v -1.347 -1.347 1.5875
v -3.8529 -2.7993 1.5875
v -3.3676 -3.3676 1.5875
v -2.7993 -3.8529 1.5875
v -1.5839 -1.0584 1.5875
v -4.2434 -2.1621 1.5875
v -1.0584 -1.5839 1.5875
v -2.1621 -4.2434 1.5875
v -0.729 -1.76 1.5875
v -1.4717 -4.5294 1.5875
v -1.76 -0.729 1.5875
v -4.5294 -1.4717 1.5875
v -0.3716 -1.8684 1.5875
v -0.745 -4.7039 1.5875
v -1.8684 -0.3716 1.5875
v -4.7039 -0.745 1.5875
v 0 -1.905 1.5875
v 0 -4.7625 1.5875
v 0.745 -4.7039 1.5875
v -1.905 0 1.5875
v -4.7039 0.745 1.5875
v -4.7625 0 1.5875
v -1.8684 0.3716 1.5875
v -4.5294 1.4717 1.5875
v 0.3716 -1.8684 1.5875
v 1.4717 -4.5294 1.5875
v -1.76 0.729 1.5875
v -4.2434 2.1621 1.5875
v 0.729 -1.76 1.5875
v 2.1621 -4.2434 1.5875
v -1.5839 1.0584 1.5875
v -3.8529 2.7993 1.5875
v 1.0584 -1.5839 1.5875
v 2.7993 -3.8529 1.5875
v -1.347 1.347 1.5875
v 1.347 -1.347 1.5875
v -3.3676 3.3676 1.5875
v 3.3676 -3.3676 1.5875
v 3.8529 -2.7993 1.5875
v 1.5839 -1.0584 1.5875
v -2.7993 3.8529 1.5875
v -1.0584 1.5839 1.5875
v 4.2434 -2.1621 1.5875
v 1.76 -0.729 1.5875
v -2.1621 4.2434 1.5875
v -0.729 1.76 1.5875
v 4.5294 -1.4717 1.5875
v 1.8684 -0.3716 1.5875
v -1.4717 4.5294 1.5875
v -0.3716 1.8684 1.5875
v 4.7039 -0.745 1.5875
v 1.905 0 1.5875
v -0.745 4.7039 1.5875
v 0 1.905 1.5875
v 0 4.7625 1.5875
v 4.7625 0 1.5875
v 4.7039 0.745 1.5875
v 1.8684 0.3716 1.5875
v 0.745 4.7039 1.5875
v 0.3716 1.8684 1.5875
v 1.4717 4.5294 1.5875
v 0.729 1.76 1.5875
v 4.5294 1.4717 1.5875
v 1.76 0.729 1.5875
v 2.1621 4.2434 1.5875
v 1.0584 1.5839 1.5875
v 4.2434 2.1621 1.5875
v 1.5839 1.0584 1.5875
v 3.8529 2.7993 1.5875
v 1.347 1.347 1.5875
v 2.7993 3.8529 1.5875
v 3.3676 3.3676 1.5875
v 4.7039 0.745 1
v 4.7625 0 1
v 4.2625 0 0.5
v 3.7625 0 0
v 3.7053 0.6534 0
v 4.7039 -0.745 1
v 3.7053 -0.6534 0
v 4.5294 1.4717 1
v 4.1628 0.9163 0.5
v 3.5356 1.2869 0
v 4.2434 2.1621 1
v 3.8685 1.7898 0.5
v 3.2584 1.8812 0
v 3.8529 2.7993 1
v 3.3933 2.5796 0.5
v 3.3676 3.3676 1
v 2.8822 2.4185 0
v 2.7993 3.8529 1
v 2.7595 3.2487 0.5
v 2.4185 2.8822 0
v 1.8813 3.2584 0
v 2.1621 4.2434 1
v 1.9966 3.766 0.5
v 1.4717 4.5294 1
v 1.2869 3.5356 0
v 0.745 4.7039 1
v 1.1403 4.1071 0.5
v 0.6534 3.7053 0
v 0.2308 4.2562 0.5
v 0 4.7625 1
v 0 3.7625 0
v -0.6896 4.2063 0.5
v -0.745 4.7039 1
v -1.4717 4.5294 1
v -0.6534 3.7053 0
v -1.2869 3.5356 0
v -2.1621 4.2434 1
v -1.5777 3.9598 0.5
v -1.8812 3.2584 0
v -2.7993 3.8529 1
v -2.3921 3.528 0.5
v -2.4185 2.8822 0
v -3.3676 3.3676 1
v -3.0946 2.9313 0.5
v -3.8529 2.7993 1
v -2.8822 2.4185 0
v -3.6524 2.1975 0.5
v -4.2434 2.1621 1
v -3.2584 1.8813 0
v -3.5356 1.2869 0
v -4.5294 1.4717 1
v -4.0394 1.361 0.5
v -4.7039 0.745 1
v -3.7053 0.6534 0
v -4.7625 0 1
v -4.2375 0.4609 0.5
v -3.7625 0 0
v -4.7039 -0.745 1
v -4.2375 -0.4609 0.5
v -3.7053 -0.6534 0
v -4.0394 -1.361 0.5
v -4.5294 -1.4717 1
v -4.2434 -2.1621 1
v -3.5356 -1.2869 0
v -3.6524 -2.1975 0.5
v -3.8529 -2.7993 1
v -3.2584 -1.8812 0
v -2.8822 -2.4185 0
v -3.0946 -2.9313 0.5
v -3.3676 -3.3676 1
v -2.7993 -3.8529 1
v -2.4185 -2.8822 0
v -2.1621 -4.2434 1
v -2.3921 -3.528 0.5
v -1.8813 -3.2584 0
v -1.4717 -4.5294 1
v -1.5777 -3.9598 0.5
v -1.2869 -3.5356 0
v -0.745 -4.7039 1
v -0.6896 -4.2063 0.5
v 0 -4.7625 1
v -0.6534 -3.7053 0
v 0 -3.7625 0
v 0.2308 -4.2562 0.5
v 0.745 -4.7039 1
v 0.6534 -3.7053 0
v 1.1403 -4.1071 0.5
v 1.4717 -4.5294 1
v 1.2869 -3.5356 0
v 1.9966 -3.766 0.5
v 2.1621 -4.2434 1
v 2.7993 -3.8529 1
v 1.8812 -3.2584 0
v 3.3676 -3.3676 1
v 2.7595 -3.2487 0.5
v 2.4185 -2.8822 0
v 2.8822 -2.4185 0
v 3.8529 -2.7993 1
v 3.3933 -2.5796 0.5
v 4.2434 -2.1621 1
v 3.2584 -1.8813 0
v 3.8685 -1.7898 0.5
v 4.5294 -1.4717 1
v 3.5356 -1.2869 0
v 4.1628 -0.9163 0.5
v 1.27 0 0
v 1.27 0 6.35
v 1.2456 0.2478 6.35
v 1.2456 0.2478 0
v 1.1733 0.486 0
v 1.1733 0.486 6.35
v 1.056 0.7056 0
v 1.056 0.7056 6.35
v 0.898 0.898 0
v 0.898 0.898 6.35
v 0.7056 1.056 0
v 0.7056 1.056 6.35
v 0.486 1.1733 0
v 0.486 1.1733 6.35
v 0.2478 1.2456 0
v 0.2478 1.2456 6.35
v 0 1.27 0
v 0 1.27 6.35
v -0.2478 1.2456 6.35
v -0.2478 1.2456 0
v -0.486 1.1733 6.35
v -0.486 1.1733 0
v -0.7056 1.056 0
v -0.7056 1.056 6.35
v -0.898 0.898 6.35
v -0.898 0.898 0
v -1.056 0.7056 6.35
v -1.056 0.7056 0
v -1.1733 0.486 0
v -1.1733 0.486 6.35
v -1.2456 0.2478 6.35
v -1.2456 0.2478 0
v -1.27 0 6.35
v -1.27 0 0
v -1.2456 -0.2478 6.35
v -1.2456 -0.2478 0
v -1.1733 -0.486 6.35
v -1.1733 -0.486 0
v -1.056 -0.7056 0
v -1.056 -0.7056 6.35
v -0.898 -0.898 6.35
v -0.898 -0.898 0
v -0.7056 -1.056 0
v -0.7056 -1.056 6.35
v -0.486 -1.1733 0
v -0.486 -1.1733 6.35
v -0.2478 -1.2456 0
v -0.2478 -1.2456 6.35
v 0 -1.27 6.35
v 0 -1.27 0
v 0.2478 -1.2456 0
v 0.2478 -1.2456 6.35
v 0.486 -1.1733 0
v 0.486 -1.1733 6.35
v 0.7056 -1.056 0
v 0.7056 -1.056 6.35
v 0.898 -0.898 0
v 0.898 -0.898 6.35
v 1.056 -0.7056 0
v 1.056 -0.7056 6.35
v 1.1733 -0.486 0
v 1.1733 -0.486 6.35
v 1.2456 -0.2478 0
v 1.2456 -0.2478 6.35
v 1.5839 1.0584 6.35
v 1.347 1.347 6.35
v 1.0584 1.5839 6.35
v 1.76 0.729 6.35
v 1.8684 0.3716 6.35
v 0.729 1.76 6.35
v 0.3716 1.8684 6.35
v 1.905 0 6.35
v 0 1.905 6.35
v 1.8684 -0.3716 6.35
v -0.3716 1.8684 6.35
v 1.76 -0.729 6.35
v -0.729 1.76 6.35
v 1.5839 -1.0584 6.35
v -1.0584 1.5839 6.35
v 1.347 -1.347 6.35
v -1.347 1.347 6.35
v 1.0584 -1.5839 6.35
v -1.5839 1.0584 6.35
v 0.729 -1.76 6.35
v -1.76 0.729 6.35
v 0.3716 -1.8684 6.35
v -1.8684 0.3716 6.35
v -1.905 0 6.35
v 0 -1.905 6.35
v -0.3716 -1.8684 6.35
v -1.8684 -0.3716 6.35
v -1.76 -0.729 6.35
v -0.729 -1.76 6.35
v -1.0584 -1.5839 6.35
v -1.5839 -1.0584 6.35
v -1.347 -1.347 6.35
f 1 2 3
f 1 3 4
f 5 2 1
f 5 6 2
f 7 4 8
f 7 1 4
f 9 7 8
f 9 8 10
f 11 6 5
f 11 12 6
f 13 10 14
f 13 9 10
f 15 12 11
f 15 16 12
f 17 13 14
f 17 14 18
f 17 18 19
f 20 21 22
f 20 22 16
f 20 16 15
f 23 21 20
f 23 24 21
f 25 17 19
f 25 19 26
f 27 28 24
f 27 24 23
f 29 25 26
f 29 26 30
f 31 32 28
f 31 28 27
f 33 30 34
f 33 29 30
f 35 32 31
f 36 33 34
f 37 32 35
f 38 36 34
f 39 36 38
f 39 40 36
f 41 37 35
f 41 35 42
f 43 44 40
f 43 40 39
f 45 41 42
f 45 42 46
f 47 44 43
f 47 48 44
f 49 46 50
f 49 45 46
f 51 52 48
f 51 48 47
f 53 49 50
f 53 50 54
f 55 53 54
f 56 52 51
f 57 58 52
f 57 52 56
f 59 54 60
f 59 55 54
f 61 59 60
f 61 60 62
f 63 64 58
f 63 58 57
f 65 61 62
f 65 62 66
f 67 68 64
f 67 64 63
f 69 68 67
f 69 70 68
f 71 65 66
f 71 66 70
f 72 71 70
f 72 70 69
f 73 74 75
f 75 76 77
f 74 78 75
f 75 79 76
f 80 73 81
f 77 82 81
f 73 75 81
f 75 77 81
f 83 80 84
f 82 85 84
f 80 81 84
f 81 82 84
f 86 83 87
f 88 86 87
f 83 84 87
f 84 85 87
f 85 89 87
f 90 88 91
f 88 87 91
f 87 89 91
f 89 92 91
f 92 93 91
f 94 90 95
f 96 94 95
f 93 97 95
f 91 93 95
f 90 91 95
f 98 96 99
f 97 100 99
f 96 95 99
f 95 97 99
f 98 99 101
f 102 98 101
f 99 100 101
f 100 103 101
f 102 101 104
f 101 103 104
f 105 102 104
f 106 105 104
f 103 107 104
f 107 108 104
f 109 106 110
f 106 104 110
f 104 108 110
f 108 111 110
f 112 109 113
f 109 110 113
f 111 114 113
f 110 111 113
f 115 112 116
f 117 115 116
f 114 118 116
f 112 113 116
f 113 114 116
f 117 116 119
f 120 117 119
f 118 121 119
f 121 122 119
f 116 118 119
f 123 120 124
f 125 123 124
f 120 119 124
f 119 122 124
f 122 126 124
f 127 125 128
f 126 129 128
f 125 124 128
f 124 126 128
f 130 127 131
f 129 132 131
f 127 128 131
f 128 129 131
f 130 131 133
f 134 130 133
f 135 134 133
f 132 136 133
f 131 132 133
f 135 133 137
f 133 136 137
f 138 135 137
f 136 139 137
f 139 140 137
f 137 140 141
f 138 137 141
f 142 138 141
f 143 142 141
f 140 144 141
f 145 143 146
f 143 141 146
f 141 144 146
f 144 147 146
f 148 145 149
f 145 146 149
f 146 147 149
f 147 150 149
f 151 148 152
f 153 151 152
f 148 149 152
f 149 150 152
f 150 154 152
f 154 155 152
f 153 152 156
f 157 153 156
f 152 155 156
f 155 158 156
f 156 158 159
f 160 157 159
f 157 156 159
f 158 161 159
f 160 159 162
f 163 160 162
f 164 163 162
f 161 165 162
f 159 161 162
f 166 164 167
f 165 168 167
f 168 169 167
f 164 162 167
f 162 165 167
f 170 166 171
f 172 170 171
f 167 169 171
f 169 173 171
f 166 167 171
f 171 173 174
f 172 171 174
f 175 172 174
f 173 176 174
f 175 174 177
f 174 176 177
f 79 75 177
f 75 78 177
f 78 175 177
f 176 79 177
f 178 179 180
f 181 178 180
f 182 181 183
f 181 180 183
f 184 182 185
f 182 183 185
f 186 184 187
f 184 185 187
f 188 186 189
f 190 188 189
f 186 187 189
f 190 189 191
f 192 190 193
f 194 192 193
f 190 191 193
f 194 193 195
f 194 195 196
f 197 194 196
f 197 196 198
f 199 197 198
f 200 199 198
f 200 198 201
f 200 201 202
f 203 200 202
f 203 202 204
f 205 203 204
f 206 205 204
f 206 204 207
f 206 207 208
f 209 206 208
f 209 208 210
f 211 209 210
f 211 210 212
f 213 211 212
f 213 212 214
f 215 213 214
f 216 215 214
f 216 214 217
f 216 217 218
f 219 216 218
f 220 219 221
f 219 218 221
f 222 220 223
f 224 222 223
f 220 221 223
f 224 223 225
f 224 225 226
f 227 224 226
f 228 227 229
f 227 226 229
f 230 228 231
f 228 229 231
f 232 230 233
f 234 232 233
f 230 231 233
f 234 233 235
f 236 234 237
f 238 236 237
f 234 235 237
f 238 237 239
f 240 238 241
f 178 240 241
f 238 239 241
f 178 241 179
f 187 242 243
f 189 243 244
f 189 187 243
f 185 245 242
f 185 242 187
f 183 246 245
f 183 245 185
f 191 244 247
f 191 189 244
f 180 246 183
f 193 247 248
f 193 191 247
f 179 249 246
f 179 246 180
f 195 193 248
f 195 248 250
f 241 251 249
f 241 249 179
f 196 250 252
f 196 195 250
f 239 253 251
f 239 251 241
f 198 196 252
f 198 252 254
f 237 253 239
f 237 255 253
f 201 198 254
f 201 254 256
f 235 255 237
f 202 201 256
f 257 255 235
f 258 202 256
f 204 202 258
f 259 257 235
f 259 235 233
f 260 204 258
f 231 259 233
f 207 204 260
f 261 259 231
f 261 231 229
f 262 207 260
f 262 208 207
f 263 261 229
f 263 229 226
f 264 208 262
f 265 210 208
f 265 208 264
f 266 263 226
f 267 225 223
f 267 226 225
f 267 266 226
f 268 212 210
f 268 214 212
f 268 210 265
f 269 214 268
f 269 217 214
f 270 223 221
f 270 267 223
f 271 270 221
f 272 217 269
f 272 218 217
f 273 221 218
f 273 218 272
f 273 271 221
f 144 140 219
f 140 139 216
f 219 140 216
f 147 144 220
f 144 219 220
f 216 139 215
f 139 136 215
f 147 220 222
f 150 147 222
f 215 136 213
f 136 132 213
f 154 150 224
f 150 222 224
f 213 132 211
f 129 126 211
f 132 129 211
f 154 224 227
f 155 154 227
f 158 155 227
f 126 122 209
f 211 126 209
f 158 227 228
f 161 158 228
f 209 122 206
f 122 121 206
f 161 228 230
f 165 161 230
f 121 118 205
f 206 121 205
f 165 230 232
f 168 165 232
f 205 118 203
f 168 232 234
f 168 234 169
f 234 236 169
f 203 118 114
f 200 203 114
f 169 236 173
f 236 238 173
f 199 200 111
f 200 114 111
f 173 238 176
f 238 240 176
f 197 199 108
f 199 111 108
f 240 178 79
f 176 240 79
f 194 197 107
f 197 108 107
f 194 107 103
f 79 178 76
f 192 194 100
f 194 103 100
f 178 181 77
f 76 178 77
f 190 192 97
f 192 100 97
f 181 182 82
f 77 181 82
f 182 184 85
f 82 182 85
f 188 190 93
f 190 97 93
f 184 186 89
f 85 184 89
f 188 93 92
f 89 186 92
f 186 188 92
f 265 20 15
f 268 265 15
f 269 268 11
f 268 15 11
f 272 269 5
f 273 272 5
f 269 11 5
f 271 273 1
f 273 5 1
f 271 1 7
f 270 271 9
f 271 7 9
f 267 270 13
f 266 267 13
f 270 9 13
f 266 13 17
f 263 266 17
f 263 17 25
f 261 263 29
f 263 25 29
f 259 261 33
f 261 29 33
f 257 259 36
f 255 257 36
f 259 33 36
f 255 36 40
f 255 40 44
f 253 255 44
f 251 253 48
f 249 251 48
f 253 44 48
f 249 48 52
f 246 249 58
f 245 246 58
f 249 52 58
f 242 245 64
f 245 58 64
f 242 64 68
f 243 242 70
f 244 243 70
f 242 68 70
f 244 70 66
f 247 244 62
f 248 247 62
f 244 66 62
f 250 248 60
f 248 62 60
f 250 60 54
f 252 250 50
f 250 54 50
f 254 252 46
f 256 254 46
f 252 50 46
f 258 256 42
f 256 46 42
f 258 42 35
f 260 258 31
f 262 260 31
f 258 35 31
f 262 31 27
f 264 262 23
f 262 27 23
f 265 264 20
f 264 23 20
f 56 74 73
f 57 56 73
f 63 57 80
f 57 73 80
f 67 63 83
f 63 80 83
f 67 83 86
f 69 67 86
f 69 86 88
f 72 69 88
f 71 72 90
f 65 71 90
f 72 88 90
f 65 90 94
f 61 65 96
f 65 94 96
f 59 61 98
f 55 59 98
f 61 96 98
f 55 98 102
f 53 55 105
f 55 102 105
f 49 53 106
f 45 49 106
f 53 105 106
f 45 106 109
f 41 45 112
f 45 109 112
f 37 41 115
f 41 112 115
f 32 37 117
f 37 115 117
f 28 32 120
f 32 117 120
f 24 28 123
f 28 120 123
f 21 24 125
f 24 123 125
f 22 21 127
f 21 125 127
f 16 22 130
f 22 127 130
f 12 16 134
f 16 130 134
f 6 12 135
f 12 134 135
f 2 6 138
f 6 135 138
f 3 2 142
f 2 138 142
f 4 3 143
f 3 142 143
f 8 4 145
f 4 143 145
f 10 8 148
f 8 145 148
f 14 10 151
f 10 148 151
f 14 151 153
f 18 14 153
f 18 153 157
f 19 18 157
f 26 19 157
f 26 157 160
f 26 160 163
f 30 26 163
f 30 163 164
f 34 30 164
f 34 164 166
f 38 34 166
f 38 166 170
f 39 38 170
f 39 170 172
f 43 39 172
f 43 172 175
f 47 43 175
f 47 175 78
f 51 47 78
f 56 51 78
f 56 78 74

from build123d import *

# Parameters (mm, degrees)
SKETCH1_R           = 4.7625
BOSS_EXTRUDE1_DEPTH = 1.5875
SKETCH3_R           = 1.905
BOSS_EXTRUDE2_DEPTH = 4.7625
SKETCH4_R           = 1.27
CUT_EXTRUDE1_DEPTH  = 10.256636133
CHAMFER2_SIZE       = 1


with BuildPart() as part:
    # Sketch1 → Boss-Extrude1 (new body)
    with BuildSketch(Plane.XY):
        Circle(SKETCH1_R)
    extrude(amount=BOSS_EXTRUDE1_DEPTH)

    # Sketch3 → Boss-Extrude2 (add)
    with BuildSketch(Plane.XY.offset(1.5875)):
        with Locations(Location((0, 0, 0), (0, 0, 180))):
            Circle(SKETCH3_R)
    extrude(amount=BOSS_EXTRUDE2_DEPTH)

    # Sketch4 → Cut-Extrude1 (cut, through all)
    with BuildSketch(Plane.XY.offset(6.35)):
        Circle(SKETCH4_R)
    extrude(amount=-CUT_EXTRUDE1_DEPTH, mode=Mode.SUBTRACT)

    # Chamfer2
    chamfer2_edges = [part.edges().sort_by_distance(p)[0] for p in [
        (-4.7625, 0, 0),
    ]]
    chamfer(chamfer2_edges, length=CHAMFER2_SIZE)


solid = part.part
